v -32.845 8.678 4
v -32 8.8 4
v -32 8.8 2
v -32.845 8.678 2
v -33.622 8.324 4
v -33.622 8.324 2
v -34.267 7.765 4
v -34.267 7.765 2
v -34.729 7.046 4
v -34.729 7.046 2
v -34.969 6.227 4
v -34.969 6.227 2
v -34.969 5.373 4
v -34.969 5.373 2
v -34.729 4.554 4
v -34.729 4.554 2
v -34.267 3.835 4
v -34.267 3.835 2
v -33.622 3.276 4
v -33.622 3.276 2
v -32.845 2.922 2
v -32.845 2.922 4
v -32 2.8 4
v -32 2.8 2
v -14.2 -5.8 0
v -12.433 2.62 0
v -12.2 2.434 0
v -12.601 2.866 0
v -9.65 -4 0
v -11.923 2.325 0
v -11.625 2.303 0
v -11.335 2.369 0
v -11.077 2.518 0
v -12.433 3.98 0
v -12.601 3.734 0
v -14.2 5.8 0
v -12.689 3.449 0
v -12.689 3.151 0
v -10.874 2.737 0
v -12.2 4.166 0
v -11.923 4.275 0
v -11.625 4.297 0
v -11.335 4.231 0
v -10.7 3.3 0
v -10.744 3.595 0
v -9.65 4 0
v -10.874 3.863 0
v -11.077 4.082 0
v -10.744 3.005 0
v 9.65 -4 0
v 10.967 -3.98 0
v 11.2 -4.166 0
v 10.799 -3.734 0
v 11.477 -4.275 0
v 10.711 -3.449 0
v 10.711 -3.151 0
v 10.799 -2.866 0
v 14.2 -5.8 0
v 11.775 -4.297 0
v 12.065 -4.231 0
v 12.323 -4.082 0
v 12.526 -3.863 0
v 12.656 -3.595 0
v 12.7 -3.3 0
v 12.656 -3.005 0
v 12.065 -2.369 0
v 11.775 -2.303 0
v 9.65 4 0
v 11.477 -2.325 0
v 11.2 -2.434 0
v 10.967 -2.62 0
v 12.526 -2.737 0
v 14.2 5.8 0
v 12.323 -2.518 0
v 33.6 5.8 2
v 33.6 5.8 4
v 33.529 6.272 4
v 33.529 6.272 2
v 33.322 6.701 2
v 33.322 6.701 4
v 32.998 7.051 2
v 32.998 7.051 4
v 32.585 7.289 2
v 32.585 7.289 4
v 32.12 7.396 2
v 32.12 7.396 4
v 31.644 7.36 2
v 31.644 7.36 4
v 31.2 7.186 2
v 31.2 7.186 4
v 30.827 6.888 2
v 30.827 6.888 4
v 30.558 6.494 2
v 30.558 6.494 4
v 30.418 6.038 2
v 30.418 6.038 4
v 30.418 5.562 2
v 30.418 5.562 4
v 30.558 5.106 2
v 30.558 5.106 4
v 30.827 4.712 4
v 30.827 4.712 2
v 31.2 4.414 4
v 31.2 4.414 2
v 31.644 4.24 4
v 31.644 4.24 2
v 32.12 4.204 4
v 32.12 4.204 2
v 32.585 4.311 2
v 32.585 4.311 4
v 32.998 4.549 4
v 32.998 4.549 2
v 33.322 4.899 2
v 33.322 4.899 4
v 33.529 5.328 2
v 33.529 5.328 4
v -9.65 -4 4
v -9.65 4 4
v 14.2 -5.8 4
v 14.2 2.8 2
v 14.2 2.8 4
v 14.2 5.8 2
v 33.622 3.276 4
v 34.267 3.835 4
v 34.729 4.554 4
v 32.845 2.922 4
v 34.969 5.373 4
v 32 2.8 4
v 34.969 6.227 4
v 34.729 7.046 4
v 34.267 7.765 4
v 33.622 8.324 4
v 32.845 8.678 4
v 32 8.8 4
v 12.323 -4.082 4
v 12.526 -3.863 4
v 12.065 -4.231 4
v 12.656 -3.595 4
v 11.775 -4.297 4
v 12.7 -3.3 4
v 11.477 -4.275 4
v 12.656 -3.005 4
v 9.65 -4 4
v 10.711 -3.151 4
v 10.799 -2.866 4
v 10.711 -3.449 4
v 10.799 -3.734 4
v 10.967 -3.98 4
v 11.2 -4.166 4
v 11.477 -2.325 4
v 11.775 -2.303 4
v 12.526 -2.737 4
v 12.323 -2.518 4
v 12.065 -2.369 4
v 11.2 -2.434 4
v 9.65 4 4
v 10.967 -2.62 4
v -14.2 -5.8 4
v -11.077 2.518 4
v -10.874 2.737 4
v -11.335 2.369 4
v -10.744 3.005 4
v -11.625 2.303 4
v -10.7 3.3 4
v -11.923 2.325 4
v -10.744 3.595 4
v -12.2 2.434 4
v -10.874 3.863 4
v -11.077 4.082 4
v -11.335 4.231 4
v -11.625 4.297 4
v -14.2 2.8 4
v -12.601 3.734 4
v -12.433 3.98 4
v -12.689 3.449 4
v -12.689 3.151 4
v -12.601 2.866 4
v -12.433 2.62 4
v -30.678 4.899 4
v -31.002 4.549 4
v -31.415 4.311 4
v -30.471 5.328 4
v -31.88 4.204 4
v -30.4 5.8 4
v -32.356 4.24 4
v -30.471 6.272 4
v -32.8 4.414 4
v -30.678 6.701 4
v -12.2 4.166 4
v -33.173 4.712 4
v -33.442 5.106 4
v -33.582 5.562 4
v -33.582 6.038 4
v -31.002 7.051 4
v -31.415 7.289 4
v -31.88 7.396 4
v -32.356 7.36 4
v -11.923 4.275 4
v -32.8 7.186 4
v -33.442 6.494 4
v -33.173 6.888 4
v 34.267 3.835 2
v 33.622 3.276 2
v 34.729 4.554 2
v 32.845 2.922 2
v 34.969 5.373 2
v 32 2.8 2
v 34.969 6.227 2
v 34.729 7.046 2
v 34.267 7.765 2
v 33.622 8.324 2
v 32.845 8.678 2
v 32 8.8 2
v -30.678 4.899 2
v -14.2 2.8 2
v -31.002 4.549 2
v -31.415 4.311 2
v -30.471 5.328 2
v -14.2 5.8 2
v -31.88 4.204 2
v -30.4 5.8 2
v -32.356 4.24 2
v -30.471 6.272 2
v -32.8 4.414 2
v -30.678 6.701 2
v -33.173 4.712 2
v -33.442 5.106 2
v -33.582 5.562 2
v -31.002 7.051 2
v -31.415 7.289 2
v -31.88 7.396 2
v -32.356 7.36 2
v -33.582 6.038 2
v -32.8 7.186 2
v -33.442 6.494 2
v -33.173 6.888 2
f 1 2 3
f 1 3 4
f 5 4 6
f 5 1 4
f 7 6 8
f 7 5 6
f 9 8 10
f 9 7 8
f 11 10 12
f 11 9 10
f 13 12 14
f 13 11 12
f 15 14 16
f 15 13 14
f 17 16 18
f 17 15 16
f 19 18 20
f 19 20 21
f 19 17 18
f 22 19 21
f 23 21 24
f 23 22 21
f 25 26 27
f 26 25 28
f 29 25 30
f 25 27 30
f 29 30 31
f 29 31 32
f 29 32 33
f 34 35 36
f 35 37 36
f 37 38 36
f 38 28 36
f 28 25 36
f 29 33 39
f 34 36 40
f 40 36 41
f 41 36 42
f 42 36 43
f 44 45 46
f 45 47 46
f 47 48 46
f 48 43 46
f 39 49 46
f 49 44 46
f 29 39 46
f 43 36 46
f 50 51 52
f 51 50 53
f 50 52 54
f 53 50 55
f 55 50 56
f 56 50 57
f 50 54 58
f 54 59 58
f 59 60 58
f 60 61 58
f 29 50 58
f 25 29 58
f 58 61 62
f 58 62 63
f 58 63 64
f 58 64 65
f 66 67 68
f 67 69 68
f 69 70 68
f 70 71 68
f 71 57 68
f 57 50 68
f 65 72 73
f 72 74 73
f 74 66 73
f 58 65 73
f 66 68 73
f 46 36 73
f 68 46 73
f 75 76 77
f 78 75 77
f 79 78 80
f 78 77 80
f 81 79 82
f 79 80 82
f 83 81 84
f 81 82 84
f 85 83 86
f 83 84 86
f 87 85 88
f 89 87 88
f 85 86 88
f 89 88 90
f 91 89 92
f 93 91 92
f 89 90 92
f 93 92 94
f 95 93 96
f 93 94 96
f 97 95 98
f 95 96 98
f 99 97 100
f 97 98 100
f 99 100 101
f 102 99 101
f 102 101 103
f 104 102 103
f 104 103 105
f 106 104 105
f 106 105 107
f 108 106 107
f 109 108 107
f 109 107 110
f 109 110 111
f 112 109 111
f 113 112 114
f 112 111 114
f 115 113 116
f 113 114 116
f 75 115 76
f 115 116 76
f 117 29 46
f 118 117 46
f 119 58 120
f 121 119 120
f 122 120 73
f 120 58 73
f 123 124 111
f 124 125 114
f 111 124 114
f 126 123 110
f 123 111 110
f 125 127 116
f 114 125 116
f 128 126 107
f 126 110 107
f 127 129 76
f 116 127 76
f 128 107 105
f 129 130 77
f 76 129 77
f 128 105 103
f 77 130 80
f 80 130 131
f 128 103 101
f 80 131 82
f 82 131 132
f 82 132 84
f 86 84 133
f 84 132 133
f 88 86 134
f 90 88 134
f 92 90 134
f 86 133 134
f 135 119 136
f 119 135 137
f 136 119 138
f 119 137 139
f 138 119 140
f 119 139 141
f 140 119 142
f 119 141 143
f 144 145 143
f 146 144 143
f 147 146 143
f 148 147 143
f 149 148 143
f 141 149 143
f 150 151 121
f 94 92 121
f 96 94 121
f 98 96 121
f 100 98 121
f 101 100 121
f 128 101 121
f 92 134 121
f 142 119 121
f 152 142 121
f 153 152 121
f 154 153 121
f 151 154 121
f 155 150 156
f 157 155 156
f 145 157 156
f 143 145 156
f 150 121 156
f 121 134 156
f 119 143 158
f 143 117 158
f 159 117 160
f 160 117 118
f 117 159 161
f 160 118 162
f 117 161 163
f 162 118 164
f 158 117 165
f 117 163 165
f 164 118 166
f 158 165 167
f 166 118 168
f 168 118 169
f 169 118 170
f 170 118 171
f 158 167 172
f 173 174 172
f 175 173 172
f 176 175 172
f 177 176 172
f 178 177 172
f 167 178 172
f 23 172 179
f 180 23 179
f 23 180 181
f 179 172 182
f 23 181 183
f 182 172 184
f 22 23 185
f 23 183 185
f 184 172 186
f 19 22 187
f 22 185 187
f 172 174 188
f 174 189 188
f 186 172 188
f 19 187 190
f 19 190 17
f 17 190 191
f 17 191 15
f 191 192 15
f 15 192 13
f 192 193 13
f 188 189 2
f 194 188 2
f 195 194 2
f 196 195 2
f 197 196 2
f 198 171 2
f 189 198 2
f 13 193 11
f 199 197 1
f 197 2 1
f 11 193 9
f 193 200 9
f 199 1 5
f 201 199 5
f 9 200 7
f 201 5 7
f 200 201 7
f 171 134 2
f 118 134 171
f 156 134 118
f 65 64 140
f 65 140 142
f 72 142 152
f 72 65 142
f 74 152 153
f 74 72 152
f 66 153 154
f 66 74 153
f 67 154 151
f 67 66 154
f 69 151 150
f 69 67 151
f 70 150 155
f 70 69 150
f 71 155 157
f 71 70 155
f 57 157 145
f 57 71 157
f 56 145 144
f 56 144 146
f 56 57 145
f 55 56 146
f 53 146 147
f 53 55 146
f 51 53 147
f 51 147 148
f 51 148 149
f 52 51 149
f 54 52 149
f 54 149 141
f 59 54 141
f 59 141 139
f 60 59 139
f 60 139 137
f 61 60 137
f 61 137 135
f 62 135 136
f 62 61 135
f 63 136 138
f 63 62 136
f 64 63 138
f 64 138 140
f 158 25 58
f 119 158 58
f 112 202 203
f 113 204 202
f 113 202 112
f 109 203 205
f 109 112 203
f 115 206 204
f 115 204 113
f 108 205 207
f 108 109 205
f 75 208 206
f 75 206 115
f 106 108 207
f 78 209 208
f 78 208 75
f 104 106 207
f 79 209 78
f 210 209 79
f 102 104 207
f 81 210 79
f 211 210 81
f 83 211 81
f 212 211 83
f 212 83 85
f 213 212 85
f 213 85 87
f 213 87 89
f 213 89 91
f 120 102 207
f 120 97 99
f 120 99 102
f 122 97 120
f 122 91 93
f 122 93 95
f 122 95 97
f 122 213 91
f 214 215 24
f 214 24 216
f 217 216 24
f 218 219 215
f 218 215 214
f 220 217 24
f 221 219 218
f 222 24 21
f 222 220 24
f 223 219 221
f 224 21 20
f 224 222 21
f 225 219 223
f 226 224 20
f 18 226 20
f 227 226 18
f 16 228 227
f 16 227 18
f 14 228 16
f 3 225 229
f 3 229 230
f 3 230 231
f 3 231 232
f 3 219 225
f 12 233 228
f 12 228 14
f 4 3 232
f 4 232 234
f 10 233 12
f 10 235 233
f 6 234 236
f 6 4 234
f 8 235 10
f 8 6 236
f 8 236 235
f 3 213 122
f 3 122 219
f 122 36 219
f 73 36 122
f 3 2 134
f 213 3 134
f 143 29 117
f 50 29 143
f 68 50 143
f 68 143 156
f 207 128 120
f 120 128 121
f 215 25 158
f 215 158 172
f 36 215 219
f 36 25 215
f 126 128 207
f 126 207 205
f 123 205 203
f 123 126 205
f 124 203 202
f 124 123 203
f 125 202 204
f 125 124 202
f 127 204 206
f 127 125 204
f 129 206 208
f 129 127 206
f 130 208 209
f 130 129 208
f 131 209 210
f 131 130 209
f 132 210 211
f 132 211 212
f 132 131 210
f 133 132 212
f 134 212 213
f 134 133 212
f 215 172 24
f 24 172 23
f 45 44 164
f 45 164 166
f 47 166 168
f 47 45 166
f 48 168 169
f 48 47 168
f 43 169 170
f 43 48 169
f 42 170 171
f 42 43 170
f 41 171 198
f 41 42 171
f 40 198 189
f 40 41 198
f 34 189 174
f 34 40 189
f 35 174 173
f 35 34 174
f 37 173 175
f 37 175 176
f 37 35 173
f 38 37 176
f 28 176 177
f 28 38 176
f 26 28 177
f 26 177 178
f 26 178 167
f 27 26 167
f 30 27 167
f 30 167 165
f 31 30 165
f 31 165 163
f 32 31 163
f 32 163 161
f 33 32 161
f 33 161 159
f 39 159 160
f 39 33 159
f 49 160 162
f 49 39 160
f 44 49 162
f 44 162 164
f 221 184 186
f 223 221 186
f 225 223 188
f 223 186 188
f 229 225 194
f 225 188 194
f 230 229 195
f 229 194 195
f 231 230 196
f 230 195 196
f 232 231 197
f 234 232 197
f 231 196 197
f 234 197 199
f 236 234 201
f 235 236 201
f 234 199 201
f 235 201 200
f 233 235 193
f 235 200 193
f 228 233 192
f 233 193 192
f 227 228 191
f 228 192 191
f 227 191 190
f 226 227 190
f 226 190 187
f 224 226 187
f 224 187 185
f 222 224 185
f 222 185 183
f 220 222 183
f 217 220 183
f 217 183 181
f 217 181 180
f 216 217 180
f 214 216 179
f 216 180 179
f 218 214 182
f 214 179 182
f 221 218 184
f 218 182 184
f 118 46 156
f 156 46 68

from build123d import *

# Parameters (mm, degrees)
SKETCH_W     = 28.4
SKETCH_H     = 11.6
SKETCH_R     = 1
SKETCH_W_2   = 19.3
SKETCH_H_2   = 8
PAD_DEPTH    = 4
SKETCH001_R  = 1.6
PAD001_DEPTH = 2


with BuildPart() as part:
    # Sketch → Pad (new body)
    with BuildSketch(Plane.XY):
        Rectangle(SKETCH_W, SKETCH_H)
        with Locations((-11.7, 3.3)):
            Circle(SKETCH_R, mode=Mode.SUBTRACT)
        with Locations((11.7, -3.3)):
            Circle(SKETCH_R, mode=Mode.SUBTRACT)
        Rectangle(SKETCH_W_2, SKETCH_H_2, mode=Mode.SUBTRACT)
    extrude(amount=PAD_DEPTH)

    # Sketch001 → Pad001 (new body)
    with BuildSketch(Plane.XY.offset(4)):
        with BuildLine():
            Line((-14.2, 2.8), (-32, 2.8))
            ThreePointArc((-32, 8.8), (-35, 5.8), (-32, 2.8))
            Line((-32, 8.8), (32, 8.8))
            ThreePointArc((32, 2.8), (35, 5.8), (32, 8.8))
            Line((32, 2.8), (14.2, 2.8))
            Line((14.2, 2.8), (14.2, 5.7))
            Line((14.2, 5.7), (-14.2, 5.7))
            Line((-14.2, 5.7), (-14.2, 2.8))
        make_face()
        with Locations((-32, 5.8)):
            Circle(SKETCH001_R, mode=Mode.SUBTRACT)
        with Locations((32, 5.8)):
            Circle(SKETCH001_R, mode=Mode.SUBTRACT)
    extrude(amount=-PAD001_DEPTH)


solid = part.part
